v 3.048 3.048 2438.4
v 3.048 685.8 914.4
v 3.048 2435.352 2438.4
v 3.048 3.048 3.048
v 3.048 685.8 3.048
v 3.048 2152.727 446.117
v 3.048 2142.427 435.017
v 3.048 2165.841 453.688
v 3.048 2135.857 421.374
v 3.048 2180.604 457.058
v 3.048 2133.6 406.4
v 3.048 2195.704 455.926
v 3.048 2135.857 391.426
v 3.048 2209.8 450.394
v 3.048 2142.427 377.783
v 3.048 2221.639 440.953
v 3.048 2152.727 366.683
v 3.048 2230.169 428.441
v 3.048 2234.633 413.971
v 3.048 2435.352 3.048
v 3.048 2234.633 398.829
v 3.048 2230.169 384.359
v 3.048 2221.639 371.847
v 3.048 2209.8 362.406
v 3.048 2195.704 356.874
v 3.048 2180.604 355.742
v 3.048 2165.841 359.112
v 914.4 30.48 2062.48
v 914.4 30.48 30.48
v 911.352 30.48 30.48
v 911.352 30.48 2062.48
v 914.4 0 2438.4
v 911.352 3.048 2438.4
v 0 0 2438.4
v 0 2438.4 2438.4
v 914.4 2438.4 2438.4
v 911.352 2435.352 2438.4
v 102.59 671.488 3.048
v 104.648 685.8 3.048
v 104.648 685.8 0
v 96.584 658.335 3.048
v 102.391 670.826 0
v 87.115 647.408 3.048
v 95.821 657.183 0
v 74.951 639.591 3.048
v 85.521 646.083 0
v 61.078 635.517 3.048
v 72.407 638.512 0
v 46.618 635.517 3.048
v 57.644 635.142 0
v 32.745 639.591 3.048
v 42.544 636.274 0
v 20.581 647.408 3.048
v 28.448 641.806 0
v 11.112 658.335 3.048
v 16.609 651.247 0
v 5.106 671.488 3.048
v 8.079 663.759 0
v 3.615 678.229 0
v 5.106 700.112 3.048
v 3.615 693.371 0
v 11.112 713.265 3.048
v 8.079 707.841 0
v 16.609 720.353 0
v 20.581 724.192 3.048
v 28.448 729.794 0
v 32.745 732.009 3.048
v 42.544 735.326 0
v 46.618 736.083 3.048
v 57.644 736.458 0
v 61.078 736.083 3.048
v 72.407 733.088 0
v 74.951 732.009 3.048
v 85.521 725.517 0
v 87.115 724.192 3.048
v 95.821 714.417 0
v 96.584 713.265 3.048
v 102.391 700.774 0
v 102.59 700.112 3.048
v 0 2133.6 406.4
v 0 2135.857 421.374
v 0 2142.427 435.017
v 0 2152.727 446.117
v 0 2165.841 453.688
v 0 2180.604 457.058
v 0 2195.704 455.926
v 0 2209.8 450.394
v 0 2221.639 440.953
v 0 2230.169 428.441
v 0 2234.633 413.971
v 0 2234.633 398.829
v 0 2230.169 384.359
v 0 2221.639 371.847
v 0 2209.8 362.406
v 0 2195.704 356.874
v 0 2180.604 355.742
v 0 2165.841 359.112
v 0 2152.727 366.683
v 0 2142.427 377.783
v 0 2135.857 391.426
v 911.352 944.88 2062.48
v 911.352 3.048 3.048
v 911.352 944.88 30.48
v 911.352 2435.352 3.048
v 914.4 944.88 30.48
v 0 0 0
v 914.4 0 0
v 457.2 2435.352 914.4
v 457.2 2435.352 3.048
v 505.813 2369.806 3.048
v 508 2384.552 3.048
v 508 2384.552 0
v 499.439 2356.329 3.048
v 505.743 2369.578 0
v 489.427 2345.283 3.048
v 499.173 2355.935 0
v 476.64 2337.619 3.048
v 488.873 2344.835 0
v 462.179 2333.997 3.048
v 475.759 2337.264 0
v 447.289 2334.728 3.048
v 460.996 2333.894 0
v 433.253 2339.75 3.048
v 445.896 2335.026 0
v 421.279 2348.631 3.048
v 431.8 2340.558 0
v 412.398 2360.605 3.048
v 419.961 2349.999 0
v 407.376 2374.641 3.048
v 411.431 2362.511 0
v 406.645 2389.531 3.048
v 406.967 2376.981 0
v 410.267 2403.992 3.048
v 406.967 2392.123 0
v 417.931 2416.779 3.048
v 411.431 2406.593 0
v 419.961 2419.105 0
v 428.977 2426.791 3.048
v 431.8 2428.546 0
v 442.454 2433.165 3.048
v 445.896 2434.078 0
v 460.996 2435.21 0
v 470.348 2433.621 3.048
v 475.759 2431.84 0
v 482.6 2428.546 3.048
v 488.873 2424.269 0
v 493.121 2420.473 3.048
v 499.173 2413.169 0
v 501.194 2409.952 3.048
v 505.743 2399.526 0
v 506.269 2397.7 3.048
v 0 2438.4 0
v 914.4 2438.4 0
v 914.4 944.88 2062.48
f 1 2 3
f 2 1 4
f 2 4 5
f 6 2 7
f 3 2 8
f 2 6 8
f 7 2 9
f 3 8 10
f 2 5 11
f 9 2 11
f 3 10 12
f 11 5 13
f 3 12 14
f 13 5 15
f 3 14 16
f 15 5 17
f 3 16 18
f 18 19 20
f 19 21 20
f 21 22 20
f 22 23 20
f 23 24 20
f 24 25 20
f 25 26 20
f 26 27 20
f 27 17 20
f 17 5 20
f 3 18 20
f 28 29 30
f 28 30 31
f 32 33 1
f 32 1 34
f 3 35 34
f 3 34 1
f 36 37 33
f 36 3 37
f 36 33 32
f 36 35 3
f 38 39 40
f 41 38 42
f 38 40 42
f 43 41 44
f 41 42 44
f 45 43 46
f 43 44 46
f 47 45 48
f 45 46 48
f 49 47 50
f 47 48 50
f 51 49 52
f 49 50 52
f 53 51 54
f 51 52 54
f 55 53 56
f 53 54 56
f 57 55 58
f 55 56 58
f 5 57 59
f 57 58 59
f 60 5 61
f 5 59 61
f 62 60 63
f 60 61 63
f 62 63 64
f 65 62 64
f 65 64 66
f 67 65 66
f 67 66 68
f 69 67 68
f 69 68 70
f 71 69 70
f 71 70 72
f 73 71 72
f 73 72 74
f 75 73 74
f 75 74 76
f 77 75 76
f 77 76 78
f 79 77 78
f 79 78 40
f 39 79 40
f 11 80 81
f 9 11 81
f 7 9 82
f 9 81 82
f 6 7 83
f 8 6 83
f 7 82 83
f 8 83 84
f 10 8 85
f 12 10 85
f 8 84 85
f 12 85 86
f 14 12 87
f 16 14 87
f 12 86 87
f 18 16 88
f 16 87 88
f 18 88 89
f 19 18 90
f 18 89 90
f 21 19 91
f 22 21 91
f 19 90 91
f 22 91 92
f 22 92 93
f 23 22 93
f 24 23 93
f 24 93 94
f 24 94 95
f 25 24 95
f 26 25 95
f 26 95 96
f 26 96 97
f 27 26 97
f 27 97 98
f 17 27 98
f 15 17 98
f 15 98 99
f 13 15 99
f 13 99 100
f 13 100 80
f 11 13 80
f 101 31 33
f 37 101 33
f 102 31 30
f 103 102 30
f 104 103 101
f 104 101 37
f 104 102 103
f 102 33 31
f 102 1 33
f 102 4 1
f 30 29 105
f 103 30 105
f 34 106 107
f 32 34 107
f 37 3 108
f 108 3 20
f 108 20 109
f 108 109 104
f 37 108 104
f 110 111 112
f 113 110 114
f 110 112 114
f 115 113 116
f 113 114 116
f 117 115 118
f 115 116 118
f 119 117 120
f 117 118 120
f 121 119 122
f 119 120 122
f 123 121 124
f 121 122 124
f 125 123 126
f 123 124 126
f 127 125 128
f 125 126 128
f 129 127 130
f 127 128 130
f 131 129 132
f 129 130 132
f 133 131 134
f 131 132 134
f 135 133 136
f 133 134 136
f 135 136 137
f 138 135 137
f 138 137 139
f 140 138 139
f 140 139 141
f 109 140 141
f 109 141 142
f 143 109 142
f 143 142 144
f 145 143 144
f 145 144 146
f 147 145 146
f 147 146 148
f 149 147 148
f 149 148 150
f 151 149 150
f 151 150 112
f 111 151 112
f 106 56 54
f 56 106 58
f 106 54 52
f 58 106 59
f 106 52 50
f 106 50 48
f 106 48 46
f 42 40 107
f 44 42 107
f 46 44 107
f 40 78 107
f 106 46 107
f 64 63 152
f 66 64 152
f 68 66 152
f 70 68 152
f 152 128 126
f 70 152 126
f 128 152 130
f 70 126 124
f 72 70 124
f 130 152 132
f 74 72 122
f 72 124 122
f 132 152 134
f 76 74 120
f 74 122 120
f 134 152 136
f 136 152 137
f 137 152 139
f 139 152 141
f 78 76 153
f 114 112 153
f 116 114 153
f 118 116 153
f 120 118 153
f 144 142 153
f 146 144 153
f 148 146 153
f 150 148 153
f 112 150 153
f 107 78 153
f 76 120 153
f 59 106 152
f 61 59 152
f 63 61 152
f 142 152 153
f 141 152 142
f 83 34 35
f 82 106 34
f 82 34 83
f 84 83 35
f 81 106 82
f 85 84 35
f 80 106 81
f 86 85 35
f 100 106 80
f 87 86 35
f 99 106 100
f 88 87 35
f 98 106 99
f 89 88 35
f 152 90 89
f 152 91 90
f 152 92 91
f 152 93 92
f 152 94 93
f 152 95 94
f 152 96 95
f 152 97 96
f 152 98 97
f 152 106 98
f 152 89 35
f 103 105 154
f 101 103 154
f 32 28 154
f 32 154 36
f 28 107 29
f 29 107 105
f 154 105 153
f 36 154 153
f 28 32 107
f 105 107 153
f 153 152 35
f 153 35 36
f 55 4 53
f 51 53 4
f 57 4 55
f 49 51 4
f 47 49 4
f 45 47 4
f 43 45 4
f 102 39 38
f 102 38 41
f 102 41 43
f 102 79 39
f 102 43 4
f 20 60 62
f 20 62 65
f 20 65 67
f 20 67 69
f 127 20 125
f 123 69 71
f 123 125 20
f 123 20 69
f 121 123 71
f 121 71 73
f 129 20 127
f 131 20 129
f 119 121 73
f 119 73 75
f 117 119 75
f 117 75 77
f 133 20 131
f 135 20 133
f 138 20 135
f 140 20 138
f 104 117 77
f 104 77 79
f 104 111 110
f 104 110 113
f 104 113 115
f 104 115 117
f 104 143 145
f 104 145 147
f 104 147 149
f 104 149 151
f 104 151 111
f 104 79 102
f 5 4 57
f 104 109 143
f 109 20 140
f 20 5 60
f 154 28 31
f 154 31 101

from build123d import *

# Parameters (mm, degrees)
F0_W     = 914.4
F0_H     = 2438.4
F1_DEPTH = 2438.4
F2_T     = -3.048
F3_R     = 50.8
F4_DEPTH = 914.4
F5_R     = 50.8
F6_DEPTH = 30.48
F7_W     = 914.4
F7_H     = 2032
F8_DEPTH = 30.48


with BuildPart() as f1:
    # F0 (on Top) → F1 (new body)
    with BuildSketch(Plane.XY):
        with Locations((457.2, 1219.2)):
            Rectangle(F0_W, F0_H)
    extrude(amount=F1_DEPTH)

    # F2
    f2_openings = [f1.faces().sort_by_distance(p)[0] for p in [
        (457.2, 1219.2, 2438.4),
    ]]
    offset(amount=F2_T, openings=f2_openings)

    # F3 (on face) → F4 (cut)
    with BuildSketch(Plane(origin=(0, 0, 0), x_dir=(1, 0, 0), z_dir=(0, 0, -1))):
        with Locations((457.2, -2384.552)):
            Circle(F3_R)
        with Locations((53.848, -685.8)):
            Circle(F3_R)
    extrude(amount=-F4_DEPTH, mode=Mode.SUBTRACT)

    # F5 (on face) → F6 (cut)
    with BuildSketch(Plane(origin=(0, 0, 0), x_dir=(0, -1, 0), z_dir=(-1, 0, 0))):
        with Locations((-2184.4, 406.4)):
            Circle(F5_R)
    extrude(amount=-F6_DEPTH, mode=Mode.SUBTRACT)

    # F7 (on face) → F8 (cut)
    with BuildSketch(Plane.YZ.offset(914.4)):
        with Locations((487.68, 1046.48)):
            Rectangle(F7_W, F7_H)
    extrude(amount=-F8_DEPTH, mode=Mode.SUBTRACT)


solid = f1.part
